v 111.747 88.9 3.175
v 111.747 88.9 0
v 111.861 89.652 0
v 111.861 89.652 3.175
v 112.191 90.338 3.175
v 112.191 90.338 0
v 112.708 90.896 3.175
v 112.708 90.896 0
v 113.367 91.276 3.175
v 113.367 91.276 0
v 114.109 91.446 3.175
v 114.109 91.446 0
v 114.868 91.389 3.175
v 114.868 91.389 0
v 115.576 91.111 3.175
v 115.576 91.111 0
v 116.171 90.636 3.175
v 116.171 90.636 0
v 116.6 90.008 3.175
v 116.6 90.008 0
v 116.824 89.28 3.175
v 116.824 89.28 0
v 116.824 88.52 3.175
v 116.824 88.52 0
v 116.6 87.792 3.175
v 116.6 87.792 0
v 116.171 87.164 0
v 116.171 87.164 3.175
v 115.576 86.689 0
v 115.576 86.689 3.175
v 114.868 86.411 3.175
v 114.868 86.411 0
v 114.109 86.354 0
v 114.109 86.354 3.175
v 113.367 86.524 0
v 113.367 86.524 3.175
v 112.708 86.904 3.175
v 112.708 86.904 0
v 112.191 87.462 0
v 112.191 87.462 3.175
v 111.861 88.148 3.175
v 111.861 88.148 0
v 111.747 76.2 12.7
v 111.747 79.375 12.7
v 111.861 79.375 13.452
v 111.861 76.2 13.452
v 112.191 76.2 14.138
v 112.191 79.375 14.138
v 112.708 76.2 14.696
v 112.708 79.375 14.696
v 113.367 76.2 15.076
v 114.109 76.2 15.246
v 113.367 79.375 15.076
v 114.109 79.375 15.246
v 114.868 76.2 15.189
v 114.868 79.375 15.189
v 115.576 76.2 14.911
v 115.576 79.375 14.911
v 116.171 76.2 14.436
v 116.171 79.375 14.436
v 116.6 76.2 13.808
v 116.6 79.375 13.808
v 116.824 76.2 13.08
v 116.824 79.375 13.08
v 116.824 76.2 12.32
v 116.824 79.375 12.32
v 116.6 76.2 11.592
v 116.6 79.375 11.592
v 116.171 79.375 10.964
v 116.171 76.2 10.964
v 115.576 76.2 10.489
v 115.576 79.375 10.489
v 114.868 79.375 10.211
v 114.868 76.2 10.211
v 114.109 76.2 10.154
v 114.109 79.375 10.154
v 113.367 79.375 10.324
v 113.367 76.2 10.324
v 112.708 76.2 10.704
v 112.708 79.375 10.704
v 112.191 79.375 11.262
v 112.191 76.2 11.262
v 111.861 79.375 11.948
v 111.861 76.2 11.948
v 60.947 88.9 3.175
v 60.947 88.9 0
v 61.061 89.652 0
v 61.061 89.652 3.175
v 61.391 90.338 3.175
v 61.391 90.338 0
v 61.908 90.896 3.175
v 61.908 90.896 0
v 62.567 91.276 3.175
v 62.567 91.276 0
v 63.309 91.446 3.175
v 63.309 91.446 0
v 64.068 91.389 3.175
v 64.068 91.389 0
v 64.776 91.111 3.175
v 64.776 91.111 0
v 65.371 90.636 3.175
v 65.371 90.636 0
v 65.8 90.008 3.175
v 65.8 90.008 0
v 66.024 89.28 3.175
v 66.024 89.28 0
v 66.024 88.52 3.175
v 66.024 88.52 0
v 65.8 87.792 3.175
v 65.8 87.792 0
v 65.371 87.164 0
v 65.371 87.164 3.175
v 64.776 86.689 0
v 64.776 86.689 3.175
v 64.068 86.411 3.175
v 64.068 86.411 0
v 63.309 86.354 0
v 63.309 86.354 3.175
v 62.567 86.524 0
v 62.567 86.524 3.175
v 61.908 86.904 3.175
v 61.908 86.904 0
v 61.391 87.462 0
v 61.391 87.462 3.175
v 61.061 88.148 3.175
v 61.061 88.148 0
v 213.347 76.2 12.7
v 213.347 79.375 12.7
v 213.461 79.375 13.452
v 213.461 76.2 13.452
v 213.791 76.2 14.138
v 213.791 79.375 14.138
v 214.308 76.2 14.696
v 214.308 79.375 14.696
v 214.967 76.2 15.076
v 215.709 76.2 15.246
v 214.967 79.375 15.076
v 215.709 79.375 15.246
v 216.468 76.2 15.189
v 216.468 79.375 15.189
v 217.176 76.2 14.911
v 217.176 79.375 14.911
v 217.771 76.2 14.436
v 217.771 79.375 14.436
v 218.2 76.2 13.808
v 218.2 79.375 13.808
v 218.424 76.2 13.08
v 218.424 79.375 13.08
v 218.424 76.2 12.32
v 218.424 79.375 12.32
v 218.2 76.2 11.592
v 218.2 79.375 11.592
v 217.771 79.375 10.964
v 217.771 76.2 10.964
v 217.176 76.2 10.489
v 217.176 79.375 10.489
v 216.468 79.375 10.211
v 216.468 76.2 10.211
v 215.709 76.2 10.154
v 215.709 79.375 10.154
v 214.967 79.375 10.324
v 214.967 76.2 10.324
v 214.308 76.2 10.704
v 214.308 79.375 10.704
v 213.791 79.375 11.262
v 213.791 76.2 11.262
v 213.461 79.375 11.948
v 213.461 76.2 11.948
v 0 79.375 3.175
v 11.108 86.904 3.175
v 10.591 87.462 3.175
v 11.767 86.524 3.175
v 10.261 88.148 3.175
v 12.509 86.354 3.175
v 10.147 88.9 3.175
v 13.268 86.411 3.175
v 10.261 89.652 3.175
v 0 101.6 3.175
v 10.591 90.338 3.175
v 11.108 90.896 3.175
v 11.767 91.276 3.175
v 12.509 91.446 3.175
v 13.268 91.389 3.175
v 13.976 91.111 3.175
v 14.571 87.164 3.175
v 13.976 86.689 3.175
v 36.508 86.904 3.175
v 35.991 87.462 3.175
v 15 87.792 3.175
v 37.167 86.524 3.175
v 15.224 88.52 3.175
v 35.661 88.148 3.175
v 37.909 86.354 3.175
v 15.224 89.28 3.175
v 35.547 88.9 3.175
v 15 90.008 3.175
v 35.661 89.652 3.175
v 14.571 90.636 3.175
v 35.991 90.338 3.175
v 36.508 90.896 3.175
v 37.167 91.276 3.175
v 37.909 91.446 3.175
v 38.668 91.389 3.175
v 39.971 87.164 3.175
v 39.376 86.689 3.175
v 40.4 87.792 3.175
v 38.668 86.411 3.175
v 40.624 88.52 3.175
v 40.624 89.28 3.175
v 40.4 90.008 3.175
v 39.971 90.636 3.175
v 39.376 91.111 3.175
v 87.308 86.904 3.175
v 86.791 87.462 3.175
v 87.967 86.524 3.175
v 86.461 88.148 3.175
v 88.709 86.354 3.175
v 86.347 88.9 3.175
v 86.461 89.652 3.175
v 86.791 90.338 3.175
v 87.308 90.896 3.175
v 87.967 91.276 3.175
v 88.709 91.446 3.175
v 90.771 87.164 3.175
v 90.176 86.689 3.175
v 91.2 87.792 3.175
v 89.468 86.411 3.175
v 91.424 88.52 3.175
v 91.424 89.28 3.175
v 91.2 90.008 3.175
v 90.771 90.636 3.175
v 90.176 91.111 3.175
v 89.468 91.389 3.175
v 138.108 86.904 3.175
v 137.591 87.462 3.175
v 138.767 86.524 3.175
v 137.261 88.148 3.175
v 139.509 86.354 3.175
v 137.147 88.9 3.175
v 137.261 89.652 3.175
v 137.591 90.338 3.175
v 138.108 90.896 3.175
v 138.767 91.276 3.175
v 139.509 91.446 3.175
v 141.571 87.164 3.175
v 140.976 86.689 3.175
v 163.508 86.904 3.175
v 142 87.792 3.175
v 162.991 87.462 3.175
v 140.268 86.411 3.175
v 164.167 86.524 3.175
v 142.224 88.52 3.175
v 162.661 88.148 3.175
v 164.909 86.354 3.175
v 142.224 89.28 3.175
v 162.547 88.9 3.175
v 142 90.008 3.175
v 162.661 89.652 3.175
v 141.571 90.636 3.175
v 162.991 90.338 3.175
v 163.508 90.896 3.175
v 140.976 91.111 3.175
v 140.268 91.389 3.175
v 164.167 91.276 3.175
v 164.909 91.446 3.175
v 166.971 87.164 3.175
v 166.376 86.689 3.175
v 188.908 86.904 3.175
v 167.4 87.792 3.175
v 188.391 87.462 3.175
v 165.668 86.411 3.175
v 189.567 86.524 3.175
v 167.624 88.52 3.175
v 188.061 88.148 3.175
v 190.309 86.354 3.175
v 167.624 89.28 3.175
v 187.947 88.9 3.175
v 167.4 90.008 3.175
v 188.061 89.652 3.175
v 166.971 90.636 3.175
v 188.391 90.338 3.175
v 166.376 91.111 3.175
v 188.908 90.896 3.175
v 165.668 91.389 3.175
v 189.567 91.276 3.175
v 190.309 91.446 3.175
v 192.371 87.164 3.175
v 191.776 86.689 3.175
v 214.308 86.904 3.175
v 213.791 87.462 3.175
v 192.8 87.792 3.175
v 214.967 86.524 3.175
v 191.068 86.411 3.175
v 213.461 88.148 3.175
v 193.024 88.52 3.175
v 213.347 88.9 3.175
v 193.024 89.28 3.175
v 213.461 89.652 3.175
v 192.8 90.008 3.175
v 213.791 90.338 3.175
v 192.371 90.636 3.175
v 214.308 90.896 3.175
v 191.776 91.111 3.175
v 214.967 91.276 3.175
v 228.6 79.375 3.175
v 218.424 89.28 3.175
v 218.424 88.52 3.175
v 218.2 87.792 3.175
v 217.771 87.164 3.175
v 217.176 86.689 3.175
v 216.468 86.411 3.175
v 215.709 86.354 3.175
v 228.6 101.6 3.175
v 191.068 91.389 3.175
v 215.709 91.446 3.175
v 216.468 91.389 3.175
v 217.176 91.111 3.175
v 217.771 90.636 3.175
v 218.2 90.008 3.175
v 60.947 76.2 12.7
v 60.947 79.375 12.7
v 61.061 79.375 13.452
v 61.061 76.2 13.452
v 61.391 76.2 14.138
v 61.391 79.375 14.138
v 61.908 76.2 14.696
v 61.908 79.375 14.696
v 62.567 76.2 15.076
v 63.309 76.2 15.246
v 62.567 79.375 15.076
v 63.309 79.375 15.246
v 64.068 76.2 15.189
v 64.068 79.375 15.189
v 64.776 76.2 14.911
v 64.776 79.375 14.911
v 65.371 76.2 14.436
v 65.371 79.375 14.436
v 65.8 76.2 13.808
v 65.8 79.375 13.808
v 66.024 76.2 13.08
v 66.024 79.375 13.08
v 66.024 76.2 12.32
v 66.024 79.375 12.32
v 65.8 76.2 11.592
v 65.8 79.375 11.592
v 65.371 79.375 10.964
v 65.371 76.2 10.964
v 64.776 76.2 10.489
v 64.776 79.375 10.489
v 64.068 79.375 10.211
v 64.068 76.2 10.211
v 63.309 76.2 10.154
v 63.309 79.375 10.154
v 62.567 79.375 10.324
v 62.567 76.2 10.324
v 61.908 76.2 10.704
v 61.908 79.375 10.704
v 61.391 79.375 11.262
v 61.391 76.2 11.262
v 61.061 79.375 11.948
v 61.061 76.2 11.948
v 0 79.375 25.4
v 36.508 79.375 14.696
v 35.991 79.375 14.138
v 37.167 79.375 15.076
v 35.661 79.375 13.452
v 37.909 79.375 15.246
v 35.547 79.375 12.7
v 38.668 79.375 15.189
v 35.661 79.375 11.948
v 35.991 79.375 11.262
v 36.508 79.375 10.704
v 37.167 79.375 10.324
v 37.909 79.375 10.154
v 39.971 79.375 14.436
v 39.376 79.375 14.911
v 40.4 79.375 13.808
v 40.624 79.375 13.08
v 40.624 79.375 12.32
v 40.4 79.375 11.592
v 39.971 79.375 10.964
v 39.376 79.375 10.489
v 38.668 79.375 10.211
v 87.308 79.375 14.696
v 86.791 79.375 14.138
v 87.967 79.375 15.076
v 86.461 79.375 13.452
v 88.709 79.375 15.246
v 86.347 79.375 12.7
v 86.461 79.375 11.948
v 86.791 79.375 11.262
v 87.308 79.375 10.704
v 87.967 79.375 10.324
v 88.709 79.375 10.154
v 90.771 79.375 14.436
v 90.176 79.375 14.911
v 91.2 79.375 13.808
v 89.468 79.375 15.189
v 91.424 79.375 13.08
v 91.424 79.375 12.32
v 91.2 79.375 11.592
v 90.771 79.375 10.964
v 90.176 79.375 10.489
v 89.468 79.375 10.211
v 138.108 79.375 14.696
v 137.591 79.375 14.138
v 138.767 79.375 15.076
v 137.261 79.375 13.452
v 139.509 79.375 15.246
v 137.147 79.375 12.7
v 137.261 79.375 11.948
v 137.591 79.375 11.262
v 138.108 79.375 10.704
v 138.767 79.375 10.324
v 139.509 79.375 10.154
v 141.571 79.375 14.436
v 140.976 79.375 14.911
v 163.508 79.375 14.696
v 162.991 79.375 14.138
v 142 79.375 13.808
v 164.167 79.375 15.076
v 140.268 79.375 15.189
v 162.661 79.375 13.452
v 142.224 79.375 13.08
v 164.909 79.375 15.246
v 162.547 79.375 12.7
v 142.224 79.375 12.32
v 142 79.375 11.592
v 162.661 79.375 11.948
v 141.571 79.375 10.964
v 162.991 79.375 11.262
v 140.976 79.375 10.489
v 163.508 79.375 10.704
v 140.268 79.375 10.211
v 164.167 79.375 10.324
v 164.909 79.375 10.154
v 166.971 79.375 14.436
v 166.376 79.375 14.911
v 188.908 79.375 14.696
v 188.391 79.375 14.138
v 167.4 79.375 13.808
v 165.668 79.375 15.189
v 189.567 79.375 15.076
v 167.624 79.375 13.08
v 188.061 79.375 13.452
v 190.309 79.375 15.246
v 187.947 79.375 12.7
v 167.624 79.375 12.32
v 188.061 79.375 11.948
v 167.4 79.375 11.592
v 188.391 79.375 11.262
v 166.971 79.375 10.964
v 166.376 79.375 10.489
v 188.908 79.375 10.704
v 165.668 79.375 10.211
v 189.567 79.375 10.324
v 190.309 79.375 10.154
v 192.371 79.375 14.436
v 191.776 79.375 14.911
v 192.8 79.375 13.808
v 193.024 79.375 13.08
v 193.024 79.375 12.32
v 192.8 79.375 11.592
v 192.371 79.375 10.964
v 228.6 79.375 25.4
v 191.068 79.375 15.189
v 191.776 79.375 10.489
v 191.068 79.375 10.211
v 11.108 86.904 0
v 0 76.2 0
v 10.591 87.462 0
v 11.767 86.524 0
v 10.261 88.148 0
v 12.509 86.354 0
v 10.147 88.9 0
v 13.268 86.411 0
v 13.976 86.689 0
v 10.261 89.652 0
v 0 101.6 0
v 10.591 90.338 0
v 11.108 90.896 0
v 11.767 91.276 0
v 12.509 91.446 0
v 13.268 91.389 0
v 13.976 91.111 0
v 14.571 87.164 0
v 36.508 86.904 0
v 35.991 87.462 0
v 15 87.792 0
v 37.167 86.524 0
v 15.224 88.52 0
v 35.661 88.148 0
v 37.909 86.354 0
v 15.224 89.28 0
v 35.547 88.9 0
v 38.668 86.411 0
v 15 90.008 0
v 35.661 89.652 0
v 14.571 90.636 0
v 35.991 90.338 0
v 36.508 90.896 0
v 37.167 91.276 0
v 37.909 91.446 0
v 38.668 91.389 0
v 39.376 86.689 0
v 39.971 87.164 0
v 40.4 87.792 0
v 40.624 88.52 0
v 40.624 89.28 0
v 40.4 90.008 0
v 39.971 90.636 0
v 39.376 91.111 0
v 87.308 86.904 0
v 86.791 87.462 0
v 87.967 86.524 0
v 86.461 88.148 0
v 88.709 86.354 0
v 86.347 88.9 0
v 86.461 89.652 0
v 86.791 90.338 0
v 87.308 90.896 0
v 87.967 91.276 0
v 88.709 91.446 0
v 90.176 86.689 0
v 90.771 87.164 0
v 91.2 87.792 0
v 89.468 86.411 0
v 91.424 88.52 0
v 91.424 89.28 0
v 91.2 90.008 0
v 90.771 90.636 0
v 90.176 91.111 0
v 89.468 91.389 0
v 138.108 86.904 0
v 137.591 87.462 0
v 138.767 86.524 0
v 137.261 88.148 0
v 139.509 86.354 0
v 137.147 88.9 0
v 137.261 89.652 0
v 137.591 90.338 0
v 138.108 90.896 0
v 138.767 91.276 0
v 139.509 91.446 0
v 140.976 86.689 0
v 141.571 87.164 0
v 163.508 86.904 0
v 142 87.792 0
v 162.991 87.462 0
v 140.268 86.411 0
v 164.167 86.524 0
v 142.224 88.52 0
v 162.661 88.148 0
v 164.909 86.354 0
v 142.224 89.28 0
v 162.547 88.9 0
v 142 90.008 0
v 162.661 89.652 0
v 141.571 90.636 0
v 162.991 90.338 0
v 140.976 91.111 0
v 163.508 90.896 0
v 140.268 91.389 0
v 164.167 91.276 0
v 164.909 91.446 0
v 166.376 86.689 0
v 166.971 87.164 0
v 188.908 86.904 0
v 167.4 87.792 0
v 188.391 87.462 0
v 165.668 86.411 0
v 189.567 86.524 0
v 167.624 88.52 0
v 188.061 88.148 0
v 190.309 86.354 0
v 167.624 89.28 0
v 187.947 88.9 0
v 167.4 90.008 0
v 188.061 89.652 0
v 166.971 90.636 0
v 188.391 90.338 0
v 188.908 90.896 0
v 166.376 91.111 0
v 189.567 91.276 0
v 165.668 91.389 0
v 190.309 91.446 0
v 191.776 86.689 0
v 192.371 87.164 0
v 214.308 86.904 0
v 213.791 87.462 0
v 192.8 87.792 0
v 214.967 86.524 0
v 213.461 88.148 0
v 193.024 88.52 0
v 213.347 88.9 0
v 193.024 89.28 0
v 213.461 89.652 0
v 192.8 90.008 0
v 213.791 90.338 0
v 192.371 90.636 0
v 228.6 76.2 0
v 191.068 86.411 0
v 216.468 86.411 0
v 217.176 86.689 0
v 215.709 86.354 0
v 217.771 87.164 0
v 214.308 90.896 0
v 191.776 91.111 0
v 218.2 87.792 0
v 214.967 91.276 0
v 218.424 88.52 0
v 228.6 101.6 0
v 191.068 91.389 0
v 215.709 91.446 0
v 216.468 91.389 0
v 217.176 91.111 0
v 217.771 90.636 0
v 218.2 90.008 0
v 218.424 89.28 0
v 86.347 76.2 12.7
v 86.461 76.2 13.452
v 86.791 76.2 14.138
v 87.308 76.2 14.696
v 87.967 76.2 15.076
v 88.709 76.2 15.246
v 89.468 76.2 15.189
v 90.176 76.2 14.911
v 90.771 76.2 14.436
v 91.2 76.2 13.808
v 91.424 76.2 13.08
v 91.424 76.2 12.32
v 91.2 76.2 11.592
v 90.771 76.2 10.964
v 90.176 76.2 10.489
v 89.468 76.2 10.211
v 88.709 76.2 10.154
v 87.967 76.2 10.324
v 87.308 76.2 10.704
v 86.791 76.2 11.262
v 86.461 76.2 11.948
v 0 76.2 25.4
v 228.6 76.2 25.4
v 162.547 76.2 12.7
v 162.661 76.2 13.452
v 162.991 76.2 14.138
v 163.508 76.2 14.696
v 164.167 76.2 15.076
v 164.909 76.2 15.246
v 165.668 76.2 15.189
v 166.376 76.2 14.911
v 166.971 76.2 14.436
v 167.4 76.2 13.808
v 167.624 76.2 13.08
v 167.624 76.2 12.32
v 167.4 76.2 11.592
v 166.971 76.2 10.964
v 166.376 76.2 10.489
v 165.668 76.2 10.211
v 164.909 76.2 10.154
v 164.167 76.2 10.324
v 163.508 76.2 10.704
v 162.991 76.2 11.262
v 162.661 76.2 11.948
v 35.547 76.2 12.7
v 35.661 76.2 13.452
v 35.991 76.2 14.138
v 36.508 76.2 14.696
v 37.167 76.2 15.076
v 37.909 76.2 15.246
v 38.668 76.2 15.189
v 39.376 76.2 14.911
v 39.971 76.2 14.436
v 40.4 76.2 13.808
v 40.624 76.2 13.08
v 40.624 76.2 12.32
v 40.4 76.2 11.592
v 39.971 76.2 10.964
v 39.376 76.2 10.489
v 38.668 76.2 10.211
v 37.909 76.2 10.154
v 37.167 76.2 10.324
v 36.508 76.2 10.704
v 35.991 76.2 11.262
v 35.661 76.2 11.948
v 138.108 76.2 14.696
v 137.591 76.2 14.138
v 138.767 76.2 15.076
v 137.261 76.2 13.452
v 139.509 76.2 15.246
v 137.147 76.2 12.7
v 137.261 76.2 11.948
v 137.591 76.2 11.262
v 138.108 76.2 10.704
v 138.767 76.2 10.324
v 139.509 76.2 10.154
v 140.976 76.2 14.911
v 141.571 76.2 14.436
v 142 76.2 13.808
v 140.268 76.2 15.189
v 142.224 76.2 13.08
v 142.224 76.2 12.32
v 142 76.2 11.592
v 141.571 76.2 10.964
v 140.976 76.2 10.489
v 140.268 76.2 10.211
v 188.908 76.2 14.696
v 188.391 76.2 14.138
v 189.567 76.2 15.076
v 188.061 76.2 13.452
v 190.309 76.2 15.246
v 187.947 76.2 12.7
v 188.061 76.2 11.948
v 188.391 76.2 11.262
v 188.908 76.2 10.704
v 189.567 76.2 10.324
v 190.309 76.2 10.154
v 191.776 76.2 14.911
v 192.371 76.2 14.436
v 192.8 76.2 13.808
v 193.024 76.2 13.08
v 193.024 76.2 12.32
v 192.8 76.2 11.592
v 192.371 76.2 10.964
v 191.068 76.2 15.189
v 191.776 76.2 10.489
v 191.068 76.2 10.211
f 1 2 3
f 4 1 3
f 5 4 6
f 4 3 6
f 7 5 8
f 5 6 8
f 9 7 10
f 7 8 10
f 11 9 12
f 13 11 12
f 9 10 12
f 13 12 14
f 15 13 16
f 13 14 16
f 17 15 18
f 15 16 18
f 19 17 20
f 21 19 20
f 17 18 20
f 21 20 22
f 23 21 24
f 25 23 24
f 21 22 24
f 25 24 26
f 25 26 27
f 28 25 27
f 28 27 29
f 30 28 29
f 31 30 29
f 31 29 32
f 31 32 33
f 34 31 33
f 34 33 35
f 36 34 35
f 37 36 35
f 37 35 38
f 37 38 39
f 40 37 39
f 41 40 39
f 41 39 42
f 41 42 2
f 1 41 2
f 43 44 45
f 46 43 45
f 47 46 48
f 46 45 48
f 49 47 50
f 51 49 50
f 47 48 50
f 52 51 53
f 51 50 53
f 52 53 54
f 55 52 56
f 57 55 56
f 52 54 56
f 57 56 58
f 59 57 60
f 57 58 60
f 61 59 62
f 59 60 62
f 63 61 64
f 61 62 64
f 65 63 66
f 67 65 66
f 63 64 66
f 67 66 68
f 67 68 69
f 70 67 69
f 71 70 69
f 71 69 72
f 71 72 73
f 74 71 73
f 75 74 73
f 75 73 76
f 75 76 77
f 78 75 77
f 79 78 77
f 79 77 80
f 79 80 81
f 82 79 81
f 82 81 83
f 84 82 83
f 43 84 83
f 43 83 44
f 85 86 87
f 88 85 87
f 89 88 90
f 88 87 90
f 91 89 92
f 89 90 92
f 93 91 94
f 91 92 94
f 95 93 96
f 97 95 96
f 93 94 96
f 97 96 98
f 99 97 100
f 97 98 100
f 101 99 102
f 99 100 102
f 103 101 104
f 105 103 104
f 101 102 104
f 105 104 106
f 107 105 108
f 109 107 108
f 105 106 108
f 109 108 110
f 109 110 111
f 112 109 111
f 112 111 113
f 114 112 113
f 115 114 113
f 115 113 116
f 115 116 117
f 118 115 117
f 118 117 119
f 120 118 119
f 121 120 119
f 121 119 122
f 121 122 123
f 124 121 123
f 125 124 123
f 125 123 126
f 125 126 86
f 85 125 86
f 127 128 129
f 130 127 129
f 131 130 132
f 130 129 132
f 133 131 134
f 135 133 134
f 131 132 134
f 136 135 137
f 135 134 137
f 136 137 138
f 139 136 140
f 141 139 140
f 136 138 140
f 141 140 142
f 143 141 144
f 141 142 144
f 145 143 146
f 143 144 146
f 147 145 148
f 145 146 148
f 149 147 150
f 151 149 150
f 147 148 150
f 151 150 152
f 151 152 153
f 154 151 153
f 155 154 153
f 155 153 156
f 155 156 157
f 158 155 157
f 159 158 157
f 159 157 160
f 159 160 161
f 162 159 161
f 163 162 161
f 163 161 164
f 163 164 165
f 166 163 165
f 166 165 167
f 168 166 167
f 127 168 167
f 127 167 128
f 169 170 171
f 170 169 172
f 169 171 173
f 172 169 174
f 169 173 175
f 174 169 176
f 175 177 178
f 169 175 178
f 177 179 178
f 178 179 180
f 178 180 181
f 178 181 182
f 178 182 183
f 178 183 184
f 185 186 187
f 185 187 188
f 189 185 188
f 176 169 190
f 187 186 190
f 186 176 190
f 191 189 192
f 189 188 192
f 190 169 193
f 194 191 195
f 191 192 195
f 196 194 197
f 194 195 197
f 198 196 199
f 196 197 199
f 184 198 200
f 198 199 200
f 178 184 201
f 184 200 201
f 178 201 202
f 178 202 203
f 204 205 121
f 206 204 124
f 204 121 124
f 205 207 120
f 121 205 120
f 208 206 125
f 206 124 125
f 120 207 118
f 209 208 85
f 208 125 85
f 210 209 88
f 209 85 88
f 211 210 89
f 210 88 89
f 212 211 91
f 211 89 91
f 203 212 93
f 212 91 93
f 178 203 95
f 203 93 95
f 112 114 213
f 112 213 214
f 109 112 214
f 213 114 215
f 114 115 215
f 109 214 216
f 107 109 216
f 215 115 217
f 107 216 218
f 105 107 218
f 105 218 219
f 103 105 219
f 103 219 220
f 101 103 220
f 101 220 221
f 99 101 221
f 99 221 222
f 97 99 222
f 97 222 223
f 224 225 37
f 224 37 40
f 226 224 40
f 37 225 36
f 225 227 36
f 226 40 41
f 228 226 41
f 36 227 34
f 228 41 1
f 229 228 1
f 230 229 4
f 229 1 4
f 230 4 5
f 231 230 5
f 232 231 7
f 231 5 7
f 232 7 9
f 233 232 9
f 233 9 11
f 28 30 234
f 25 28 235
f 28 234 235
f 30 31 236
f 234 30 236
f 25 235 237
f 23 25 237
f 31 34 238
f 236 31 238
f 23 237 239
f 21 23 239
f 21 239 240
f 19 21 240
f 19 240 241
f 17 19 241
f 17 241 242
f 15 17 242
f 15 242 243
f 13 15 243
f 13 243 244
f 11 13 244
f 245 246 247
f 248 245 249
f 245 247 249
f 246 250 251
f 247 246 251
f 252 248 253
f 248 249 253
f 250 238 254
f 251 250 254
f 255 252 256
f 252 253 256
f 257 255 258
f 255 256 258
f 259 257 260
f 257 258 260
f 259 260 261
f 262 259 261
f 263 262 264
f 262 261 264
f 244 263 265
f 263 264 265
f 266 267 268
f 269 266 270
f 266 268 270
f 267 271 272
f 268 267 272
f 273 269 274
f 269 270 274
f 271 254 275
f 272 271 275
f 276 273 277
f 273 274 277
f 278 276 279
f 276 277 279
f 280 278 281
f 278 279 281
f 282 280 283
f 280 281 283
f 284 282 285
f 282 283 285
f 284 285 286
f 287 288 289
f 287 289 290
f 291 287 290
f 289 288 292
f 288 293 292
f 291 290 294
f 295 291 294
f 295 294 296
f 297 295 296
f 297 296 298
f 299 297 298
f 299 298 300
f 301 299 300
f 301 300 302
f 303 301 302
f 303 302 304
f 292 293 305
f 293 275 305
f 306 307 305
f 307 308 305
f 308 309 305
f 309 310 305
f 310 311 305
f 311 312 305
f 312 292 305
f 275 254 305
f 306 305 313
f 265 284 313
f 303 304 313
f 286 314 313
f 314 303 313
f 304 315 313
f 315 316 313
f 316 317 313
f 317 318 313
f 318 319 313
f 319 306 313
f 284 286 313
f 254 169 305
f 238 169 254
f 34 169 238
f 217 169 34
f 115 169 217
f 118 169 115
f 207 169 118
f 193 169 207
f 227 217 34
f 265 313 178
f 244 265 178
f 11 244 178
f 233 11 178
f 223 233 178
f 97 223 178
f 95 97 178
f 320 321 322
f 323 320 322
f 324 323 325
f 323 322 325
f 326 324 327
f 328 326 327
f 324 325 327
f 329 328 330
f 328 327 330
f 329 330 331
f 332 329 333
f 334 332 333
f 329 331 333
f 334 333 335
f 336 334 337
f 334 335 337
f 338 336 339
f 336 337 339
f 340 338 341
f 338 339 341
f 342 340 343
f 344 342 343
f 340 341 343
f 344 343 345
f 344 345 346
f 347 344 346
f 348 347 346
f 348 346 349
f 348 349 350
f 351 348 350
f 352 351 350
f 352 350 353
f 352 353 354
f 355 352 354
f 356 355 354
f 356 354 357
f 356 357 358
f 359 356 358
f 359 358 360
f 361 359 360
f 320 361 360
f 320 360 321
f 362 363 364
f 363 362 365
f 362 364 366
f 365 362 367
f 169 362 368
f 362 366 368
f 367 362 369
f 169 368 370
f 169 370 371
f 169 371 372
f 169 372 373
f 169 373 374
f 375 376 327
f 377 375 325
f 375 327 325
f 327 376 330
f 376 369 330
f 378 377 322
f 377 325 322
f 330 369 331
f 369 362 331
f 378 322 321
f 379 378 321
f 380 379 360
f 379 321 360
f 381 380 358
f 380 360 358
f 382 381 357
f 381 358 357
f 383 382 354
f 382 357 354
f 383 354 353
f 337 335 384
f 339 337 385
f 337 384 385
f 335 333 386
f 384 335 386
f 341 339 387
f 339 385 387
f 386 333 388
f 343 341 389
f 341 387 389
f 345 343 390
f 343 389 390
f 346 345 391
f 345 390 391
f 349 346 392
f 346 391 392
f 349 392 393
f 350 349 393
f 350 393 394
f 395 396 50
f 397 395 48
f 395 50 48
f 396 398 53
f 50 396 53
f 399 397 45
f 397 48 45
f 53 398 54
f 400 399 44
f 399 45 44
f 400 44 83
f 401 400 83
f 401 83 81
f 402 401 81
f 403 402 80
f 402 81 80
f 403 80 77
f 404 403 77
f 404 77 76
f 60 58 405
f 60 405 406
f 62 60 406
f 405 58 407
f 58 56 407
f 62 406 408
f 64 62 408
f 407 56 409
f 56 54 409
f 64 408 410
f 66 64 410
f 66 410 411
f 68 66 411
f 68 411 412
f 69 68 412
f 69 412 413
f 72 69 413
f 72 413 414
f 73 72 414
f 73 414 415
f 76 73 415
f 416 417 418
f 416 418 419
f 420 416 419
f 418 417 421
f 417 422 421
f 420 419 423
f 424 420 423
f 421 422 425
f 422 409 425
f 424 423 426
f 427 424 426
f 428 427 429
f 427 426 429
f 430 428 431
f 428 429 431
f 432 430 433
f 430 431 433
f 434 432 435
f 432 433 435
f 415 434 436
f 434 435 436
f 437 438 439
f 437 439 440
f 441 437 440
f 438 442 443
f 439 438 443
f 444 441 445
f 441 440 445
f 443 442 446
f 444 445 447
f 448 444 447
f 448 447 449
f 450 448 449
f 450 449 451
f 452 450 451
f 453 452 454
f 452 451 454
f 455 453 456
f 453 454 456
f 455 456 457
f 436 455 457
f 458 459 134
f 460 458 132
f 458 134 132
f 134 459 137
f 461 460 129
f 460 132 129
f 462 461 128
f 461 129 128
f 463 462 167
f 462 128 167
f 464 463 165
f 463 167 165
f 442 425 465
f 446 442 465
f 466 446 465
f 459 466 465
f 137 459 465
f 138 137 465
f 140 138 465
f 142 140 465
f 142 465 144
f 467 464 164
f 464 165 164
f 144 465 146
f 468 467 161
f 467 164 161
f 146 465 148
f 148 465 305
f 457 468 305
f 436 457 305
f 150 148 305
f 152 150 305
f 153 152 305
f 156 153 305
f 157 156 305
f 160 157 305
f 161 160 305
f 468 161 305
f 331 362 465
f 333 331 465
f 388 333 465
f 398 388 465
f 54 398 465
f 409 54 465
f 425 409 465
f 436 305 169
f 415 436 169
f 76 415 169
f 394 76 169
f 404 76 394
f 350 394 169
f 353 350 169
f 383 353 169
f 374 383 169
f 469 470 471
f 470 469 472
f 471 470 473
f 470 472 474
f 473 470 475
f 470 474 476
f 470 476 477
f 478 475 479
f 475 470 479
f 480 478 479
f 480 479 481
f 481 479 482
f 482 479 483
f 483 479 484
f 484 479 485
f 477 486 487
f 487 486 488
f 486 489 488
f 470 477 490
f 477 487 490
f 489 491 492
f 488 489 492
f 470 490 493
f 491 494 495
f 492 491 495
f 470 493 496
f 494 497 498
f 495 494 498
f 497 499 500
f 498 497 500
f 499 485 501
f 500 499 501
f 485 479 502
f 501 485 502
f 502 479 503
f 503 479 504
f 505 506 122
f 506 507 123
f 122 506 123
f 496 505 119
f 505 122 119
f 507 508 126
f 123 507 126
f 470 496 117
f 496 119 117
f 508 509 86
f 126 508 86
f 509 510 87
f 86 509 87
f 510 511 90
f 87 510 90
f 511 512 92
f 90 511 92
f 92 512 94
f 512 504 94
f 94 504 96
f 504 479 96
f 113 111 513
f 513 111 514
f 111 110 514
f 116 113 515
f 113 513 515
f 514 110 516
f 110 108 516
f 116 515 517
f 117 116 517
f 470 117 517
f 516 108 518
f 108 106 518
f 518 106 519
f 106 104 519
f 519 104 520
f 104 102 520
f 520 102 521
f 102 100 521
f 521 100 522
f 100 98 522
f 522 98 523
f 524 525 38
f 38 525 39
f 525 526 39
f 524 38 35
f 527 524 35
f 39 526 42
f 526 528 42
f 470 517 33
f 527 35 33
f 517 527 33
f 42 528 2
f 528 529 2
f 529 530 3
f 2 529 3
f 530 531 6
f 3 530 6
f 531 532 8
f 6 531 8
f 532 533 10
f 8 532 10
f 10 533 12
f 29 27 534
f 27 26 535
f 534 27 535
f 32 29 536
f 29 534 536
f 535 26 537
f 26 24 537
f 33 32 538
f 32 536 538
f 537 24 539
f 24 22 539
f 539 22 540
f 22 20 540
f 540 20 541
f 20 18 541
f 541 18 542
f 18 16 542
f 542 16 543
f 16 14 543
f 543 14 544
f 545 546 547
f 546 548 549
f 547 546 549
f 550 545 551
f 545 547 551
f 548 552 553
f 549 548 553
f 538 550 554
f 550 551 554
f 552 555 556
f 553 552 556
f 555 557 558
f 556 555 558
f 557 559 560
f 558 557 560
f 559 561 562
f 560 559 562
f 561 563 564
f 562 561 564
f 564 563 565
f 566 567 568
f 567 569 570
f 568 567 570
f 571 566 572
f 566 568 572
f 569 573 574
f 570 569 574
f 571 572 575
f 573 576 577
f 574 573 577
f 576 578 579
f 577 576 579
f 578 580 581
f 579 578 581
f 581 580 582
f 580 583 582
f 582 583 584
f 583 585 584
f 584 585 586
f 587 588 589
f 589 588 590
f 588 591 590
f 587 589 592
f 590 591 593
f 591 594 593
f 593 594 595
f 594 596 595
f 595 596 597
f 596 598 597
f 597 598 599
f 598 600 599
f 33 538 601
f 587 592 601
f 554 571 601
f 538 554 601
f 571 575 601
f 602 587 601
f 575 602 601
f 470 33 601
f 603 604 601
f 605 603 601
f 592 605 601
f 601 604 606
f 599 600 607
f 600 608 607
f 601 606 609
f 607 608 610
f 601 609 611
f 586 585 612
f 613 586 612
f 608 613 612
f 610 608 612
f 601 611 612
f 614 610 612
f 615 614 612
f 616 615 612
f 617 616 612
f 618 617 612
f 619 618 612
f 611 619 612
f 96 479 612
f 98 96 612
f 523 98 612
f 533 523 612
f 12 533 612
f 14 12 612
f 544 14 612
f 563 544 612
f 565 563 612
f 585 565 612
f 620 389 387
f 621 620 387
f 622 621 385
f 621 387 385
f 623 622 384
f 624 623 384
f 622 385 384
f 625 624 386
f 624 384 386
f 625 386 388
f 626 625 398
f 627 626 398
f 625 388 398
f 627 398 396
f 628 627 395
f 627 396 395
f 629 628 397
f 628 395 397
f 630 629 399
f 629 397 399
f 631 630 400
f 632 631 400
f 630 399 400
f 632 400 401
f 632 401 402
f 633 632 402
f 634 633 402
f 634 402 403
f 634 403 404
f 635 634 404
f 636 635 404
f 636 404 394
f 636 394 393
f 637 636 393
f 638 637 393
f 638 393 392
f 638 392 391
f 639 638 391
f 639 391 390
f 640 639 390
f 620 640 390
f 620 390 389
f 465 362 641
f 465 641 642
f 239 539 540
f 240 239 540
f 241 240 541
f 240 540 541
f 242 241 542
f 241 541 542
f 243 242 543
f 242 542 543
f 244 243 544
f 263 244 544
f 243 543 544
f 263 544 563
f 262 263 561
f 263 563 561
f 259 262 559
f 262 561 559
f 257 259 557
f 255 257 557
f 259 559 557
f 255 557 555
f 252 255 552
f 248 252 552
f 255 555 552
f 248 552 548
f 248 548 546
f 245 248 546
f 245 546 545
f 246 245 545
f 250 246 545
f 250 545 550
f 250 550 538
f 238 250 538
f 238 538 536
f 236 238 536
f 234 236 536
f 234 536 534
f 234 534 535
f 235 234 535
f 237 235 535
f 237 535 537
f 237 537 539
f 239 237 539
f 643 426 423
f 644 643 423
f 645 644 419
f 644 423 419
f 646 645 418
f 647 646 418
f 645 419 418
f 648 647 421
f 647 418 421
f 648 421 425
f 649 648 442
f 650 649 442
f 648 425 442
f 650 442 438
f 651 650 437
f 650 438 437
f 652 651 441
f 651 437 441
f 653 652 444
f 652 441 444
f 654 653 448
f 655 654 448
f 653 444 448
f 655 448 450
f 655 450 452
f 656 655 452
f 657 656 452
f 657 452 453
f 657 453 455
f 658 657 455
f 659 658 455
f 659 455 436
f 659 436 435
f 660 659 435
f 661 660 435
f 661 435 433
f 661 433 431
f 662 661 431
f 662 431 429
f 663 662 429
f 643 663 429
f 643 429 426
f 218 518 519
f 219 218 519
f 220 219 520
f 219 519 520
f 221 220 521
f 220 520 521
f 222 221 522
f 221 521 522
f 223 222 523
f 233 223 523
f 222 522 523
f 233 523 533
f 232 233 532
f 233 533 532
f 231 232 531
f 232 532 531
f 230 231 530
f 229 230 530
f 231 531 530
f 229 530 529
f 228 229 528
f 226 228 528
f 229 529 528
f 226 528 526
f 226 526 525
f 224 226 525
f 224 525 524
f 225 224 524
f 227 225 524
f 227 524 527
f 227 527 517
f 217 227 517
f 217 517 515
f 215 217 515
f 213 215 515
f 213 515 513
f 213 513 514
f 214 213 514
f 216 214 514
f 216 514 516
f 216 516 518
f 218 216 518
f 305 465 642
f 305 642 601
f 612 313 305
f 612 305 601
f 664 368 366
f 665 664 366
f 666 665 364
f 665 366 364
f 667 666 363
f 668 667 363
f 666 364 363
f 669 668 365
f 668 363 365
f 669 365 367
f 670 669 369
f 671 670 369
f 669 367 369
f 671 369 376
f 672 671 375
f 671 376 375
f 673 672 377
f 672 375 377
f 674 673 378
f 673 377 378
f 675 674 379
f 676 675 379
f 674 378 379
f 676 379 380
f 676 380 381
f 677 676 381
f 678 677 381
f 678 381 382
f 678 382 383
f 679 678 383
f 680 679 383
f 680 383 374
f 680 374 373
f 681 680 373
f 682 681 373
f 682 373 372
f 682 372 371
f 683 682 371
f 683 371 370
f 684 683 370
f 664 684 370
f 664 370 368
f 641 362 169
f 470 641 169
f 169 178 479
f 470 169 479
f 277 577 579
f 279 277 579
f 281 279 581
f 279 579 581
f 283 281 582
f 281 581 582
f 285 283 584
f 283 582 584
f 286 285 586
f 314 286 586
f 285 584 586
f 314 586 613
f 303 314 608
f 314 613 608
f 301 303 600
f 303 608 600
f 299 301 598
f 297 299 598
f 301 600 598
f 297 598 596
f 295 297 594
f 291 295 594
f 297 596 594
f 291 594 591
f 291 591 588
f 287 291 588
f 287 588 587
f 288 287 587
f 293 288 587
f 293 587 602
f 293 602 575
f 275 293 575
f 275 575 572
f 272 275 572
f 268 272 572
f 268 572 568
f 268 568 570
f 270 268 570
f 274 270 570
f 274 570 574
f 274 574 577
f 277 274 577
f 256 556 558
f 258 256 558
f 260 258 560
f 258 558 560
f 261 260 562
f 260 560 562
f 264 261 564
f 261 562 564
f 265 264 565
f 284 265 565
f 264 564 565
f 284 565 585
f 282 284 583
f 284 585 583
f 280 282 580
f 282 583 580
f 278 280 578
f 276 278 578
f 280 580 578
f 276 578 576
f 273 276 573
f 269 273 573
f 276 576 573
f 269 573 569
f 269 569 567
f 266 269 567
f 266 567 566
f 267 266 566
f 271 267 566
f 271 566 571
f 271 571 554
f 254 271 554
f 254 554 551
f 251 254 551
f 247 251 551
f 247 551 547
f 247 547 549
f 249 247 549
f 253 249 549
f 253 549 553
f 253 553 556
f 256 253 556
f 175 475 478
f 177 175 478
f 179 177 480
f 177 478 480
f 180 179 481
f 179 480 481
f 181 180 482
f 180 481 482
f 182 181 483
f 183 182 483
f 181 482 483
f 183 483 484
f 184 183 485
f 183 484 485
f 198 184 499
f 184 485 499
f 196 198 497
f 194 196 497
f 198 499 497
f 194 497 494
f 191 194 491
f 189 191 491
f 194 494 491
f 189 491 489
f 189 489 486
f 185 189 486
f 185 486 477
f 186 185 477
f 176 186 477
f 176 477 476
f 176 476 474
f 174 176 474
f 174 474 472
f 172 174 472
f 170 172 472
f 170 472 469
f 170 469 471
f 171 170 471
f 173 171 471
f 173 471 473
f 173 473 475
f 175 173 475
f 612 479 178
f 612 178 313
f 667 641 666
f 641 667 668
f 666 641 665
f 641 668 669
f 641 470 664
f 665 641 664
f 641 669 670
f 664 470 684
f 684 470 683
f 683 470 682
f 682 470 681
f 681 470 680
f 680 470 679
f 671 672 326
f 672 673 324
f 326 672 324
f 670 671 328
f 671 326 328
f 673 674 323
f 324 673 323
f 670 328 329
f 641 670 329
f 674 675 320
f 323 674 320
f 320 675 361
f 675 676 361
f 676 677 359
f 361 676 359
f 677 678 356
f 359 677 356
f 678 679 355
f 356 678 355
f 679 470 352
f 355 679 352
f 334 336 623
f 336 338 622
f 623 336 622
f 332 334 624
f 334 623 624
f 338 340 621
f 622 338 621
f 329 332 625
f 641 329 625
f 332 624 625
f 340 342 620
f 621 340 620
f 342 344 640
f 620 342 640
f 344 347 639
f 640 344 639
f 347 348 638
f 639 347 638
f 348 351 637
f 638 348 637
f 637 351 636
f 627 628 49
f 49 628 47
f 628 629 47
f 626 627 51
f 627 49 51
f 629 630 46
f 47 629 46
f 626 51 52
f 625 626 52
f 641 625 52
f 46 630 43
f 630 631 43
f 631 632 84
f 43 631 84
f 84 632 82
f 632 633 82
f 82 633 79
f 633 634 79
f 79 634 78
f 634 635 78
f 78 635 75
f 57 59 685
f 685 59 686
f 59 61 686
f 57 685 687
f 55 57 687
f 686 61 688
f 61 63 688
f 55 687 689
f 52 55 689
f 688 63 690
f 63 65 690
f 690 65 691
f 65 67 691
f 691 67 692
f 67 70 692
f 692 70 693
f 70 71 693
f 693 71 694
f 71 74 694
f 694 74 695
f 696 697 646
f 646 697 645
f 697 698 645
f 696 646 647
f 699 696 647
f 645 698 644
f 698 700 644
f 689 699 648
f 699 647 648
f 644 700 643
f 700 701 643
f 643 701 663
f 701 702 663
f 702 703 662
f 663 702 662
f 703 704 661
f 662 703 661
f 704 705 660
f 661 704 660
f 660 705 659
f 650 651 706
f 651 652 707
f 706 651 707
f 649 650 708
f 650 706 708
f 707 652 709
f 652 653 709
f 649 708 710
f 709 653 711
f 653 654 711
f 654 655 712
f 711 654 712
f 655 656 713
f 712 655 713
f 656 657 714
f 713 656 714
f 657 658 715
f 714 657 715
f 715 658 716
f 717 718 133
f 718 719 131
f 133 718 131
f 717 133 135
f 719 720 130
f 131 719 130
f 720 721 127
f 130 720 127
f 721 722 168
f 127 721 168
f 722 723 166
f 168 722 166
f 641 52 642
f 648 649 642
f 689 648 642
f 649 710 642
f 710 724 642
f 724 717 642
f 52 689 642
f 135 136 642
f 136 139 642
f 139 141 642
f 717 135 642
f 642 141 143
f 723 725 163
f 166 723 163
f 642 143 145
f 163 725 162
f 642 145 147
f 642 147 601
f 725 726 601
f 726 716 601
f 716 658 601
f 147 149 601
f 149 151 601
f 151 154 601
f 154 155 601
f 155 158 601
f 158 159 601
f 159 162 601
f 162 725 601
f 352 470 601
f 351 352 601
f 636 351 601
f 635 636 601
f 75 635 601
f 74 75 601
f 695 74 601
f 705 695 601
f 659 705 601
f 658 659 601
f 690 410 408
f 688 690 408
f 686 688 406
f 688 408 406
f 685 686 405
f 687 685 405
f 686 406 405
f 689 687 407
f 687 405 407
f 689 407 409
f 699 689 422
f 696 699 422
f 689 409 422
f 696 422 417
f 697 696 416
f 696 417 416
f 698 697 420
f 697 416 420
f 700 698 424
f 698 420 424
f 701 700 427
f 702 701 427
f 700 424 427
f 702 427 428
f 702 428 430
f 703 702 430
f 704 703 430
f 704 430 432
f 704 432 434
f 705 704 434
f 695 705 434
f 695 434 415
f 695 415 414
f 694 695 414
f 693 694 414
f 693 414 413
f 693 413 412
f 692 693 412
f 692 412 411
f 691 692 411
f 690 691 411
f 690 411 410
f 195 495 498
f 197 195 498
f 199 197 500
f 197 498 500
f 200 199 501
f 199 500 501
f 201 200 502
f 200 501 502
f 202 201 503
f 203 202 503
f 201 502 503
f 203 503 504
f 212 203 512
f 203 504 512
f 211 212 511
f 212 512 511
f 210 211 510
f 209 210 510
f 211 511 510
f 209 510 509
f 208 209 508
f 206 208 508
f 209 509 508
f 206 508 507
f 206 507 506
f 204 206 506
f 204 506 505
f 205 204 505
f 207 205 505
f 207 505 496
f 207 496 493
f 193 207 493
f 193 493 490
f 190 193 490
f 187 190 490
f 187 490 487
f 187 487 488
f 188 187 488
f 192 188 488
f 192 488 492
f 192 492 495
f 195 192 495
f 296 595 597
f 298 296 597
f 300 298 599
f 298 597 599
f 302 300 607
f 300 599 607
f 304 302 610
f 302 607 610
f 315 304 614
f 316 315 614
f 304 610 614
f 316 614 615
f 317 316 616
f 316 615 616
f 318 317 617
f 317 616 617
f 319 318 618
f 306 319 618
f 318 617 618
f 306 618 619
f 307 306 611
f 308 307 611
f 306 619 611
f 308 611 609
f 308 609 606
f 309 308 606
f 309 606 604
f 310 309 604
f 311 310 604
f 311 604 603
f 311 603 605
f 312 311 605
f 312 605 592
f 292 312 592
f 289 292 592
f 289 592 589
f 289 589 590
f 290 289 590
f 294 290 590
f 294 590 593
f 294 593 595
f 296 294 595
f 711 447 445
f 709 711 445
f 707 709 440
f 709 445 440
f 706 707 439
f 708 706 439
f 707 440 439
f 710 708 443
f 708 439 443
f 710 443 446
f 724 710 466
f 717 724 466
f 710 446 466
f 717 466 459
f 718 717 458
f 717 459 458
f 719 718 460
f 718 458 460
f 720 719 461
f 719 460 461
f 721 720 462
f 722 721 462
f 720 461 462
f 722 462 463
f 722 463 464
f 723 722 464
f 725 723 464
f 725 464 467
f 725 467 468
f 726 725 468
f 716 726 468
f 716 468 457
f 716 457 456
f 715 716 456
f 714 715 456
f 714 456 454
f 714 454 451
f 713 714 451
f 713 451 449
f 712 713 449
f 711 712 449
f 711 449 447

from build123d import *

# Parameters (mm, degrees)
SKETCH1_W                      = 228.6
SKETCH1_H                      = 25.4
BOSS_EXTRUDE1_DEPTH            = 25.4
SKETCH2_W                      = 22.225
SKETCH2_H                      = 22.225
CUT_EXTRUDE1_DEPTH             = 252.44717139
F_7_0_201_DIAMETER_HOLE1_D     = 5.1054
F_7_0_201_DIAMETER_HOLE1_DEPTH = 25.4
F_7_0_201_DIAMETER_HOLE2_D     = 5.1054


with BuildPart() as part:
    # Sketch1 → Boss-Extrude1 (new body)
    with BuildSketch(Plane(origin=(0, 101.6, 0), x_dir=(1, 0, 0), z_dir=(0, 1, 0))):
        with Locations((114.3, -12.7)):
            Rectangle(SKETCH1_W, SKETCH1_H)
    extrude(amount=-BOSS_EXTRUDE1_DEPTH)

    # Sketch2 → Cut-Extrude1 (cut, through all)
    with BuildSketch(Plane(origin=(228.6, 0, 0), x_dir=(0, 0, -1), z_dir=(1, 0, 0))):
        with Locations((-14.2875, 90.4875)):
            Rectangle(SKETCH2_W, SKETCH2_H)
    extrude(amount=-CUT_EXTRUDE1_DEPTH, mode=Mode.SUBTRACT)

    # #7 (0.201) Diameter Hole1
    with Locations(Plane.XZ.offset(-76.2)):
        with Locations((-12.7, -12.7), (38.1, 12.7), (63.5, 12.7), (88.9, 12.7), (114.3, 12.7), (139.7, 12.7), (165.1, 12.7), (190.5, 12.7), (215.9, 12.7)):
            Hole(F_7_0_201_DIAMETER_HOLE1_D / 2, depth=F_7_0_201_DIAMETER_HOLE1_DEPTH)

    # #7 (0.201) Diameter Hole2 (through all)
    with Locations(Plane.XY.offset(3.175)):
        with Locations((12.7, 88.9), (38.1, 88.9), (63.5, 88.9), (88.9, 88.9), (114.3, 88.9), (139.7, 88.9), (165.1, 88.9), (190.5, 88.9), (215.9, 88.9)):
            Hole(F_7_0_201_DIAMETER_HOLE2_D / 2)


solid = part.part
